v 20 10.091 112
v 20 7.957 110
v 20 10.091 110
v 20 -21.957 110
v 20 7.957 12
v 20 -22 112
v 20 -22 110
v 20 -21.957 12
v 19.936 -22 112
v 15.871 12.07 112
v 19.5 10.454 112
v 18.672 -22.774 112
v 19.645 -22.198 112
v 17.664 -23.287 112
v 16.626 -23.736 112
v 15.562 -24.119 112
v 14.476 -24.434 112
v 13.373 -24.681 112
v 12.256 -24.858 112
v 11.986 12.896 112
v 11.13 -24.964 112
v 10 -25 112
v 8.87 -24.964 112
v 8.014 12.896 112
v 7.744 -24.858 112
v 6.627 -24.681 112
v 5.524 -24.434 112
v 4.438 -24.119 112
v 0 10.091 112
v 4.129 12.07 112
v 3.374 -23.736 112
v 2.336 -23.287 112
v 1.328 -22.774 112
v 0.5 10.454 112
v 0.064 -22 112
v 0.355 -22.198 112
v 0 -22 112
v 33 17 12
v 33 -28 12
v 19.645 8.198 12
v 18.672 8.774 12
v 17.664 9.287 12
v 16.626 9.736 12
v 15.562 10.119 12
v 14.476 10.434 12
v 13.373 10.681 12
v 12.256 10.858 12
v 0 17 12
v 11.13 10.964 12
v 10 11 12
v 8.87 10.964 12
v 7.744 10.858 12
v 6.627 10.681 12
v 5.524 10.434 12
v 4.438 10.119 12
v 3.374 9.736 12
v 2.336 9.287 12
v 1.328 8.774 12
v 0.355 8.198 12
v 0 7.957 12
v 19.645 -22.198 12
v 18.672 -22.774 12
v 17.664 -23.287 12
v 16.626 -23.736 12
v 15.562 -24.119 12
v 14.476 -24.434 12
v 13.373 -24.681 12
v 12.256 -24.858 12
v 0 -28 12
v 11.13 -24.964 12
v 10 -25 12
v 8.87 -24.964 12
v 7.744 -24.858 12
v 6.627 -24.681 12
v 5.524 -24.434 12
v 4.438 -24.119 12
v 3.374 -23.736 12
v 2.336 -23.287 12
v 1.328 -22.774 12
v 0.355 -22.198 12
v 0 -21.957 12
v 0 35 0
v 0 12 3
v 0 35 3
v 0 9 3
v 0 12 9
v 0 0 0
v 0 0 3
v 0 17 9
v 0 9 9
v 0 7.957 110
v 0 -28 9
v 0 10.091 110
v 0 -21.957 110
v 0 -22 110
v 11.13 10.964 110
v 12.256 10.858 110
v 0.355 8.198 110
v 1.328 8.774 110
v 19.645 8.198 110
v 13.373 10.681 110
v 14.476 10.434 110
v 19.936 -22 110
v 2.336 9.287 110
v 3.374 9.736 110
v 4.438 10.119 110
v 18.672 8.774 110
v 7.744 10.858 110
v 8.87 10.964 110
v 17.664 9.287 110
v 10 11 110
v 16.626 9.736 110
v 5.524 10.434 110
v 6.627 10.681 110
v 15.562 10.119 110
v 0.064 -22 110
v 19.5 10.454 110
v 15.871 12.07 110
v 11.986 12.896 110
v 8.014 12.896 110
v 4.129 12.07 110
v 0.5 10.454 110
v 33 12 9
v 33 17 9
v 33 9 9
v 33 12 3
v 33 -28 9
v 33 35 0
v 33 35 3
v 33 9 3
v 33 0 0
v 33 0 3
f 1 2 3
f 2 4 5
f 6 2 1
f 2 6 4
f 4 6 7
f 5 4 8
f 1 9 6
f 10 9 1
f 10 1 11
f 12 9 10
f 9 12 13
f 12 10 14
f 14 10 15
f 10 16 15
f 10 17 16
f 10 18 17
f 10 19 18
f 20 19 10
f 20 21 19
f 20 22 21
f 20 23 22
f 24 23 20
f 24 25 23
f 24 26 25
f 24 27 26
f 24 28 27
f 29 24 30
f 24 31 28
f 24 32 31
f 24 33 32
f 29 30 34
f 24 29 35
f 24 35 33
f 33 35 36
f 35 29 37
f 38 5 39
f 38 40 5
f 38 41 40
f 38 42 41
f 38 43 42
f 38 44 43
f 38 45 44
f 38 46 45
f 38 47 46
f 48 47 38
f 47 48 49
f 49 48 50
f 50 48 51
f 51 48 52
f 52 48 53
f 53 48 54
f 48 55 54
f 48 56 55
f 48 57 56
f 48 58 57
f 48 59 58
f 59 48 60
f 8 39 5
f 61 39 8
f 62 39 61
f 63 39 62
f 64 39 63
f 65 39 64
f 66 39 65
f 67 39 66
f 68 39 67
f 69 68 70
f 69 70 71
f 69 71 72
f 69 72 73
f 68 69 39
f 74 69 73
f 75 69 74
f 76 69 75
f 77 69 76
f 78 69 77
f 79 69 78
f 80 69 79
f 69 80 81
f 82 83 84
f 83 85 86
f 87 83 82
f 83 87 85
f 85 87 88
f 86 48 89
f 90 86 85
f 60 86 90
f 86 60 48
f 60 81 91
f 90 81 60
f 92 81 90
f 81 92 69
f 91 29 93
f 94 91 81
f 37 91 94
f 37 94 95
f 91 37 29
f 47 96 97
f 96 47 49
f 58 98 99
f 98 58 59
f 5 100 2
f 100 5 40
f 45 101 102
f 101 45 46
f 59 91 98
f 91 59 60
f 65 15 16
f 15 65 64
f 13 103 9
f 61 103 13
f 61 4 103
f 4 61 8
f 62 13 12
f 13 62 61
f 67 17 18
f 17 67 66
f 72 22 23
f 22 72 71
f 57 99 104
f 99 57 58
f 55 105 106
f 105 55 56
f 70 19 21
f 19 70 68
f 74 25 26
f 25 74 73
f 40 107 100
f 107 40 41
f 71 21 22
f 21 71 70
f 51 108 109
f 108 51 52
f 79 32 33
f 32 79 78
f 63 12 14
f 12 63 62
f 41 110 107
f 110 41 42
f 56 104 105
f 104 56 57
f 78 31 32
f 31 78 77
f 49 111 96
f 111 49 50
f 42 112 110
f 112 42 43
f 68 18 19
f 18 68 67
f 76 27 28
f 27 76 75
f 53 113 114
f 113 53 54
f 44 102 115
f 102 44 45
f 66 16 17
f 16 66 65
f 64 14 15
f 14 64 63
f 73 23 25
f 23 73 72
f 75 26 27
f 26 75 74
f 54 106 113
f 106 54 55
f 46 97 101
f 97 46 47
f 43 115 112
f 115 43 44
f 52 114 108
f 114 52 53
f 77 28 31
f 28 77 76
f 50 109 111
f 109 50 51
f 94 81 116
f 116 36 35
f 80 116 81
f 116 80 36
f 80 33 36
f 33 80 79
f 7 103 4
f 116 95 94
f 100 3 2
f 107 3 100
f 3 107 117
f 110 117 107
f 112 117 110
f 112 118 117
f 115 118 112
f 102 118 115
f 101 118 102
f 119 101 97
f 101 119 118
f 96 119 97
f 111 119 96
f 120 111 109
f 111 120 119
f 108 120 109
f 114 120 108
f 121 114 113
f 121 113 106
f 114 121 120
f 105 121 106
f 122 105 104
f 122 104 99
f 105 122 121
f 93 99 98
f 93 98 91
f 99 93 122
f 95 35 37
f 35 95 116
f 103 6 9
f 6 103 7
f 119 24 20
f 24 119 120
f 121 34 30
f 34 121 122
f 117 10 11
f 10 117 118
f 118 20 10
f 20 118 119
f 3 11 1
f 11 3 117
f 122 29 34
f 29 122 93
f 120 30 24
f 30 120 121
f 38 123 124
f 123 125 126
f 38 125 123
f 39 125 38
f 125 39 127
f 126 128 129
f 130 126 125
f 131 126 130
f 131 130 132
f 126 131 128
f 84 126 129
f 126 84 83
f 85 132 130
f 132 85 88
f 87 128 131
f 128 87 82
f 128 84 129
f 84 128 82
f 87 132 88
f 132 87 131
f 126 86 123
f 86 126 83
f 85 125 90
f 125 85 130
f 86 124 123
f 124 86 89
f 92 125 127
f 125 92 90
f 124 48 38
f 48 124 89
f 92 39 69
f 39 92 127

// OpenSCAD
cube([33,35,3]);
translate([0,9,0])cube([33,3,10]);
translate([0,-28,9])cube([33,45,3]);
translate([0,-25,12]){
	intersection(){
	cube([20,40,100]);
	translate([10,18,0])cylinder(r= 18, h = 100, $fn = 100);
	}
}
translate([0,-22,110]){
	intersection(){
		cube([20,35,2]);
		translate([10,16,0])cylinder(r = 19, h = 2);
	}
}

//100
